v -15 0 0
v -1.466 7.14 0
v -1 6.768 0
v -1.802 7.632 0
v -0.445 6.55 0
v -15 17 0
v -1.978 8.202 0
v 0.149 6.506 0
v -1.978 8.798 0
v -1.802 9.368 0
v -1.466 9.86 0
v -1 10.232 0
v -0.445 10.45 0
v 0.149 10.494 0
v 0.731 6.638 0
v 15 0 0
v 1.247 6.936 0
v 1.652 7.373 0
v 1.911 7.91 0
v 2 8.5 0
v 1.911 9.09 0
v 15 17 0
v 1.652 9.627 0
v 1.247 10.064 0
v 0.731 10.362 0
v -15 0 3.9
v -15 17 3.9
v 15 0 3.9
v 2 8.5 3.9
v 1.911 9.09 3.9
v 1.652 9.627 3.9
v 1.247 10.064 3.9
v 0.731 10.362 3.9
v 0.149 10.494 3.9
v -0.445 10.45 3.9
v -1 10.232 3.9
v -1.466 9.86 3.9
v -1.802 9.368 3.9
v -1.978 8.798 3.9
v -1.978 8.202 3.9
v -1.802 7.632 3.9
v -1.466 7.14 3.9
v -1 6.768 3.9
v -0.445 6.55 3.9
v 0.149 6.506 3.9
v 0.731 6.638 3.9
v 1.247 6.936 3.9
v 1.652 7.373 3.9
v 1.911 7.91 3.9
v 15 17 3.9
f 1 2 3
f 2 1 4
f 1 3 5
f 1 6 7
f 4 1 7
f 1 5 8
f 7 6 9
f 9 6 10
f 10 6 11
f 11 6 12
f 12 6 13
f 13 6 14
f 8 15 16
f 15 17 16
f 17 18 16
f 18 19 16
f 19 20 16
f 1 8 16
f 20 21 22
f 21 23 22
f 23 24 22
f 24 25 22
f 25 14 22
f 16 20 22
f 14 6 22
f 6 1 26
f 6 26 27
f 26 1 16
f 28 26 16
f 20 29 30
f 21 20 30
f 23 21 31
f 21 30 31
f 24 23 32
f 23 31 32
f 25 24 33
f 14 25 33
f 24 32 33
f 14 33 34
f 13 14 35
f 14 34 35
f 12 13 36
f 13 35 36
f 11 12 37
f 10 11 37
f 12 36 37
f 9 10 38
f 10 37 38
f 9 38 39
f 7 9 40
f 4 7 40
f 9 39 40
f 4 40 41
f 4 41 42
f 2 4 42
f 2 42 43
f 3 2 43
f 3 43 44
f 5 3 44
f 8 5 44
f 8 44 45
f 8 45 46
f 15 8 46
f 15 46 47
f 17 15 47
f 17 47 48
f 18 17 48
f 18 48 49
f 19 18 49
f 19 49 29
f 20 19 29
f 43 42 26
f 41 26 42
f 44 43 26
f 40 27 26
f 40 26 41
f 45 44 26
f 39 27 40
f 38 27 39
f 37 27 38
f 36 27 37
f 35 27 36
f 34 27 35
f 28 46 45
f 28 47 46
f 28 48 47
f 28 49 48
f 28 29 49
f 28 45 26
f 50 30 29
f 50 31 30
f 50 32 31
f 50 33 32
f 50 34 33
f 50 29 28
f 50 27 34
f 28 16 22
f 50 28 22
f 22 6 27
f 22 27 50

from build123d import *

# Parameters (mm, degrees)
ESQUISSE1_W                  = 30
ESQUISSE1_H                  = 17
BOSS_EXTRU_1_DEPTH           = 3.9
F_4_0_4_DIAMETER_HOLE1_D     = 4
F_4_0_4_DIAMETER_HOLE1_DEPTH = 3.9


with BuildPart() as part:
    # Esquisse1 → Boss.-Extru.1 (new body)
    with BuildSketch(Plane.XY):
        with Locations((0, 8.5)):
            Rectangle(ESQUISSE1_W, ESQUISSE1_H)
    extrude(amount=BOSS_EXTRU_1_DEPTH)

    # Ø4.0 (4) Diameter Hole1
    with Locations(Plane(origin=(0, 0, 0), x_dir=(-1, 0, 0), z_dir=(0, 0, -1))):
        with Locations((0, 8.5)):
            Hole(F_4_0_4_DIAMETER_HOLE1_D / 2, depth=F_4_0_4_DIAMETER_HOLE1_DEPTH)


solid = part.part
